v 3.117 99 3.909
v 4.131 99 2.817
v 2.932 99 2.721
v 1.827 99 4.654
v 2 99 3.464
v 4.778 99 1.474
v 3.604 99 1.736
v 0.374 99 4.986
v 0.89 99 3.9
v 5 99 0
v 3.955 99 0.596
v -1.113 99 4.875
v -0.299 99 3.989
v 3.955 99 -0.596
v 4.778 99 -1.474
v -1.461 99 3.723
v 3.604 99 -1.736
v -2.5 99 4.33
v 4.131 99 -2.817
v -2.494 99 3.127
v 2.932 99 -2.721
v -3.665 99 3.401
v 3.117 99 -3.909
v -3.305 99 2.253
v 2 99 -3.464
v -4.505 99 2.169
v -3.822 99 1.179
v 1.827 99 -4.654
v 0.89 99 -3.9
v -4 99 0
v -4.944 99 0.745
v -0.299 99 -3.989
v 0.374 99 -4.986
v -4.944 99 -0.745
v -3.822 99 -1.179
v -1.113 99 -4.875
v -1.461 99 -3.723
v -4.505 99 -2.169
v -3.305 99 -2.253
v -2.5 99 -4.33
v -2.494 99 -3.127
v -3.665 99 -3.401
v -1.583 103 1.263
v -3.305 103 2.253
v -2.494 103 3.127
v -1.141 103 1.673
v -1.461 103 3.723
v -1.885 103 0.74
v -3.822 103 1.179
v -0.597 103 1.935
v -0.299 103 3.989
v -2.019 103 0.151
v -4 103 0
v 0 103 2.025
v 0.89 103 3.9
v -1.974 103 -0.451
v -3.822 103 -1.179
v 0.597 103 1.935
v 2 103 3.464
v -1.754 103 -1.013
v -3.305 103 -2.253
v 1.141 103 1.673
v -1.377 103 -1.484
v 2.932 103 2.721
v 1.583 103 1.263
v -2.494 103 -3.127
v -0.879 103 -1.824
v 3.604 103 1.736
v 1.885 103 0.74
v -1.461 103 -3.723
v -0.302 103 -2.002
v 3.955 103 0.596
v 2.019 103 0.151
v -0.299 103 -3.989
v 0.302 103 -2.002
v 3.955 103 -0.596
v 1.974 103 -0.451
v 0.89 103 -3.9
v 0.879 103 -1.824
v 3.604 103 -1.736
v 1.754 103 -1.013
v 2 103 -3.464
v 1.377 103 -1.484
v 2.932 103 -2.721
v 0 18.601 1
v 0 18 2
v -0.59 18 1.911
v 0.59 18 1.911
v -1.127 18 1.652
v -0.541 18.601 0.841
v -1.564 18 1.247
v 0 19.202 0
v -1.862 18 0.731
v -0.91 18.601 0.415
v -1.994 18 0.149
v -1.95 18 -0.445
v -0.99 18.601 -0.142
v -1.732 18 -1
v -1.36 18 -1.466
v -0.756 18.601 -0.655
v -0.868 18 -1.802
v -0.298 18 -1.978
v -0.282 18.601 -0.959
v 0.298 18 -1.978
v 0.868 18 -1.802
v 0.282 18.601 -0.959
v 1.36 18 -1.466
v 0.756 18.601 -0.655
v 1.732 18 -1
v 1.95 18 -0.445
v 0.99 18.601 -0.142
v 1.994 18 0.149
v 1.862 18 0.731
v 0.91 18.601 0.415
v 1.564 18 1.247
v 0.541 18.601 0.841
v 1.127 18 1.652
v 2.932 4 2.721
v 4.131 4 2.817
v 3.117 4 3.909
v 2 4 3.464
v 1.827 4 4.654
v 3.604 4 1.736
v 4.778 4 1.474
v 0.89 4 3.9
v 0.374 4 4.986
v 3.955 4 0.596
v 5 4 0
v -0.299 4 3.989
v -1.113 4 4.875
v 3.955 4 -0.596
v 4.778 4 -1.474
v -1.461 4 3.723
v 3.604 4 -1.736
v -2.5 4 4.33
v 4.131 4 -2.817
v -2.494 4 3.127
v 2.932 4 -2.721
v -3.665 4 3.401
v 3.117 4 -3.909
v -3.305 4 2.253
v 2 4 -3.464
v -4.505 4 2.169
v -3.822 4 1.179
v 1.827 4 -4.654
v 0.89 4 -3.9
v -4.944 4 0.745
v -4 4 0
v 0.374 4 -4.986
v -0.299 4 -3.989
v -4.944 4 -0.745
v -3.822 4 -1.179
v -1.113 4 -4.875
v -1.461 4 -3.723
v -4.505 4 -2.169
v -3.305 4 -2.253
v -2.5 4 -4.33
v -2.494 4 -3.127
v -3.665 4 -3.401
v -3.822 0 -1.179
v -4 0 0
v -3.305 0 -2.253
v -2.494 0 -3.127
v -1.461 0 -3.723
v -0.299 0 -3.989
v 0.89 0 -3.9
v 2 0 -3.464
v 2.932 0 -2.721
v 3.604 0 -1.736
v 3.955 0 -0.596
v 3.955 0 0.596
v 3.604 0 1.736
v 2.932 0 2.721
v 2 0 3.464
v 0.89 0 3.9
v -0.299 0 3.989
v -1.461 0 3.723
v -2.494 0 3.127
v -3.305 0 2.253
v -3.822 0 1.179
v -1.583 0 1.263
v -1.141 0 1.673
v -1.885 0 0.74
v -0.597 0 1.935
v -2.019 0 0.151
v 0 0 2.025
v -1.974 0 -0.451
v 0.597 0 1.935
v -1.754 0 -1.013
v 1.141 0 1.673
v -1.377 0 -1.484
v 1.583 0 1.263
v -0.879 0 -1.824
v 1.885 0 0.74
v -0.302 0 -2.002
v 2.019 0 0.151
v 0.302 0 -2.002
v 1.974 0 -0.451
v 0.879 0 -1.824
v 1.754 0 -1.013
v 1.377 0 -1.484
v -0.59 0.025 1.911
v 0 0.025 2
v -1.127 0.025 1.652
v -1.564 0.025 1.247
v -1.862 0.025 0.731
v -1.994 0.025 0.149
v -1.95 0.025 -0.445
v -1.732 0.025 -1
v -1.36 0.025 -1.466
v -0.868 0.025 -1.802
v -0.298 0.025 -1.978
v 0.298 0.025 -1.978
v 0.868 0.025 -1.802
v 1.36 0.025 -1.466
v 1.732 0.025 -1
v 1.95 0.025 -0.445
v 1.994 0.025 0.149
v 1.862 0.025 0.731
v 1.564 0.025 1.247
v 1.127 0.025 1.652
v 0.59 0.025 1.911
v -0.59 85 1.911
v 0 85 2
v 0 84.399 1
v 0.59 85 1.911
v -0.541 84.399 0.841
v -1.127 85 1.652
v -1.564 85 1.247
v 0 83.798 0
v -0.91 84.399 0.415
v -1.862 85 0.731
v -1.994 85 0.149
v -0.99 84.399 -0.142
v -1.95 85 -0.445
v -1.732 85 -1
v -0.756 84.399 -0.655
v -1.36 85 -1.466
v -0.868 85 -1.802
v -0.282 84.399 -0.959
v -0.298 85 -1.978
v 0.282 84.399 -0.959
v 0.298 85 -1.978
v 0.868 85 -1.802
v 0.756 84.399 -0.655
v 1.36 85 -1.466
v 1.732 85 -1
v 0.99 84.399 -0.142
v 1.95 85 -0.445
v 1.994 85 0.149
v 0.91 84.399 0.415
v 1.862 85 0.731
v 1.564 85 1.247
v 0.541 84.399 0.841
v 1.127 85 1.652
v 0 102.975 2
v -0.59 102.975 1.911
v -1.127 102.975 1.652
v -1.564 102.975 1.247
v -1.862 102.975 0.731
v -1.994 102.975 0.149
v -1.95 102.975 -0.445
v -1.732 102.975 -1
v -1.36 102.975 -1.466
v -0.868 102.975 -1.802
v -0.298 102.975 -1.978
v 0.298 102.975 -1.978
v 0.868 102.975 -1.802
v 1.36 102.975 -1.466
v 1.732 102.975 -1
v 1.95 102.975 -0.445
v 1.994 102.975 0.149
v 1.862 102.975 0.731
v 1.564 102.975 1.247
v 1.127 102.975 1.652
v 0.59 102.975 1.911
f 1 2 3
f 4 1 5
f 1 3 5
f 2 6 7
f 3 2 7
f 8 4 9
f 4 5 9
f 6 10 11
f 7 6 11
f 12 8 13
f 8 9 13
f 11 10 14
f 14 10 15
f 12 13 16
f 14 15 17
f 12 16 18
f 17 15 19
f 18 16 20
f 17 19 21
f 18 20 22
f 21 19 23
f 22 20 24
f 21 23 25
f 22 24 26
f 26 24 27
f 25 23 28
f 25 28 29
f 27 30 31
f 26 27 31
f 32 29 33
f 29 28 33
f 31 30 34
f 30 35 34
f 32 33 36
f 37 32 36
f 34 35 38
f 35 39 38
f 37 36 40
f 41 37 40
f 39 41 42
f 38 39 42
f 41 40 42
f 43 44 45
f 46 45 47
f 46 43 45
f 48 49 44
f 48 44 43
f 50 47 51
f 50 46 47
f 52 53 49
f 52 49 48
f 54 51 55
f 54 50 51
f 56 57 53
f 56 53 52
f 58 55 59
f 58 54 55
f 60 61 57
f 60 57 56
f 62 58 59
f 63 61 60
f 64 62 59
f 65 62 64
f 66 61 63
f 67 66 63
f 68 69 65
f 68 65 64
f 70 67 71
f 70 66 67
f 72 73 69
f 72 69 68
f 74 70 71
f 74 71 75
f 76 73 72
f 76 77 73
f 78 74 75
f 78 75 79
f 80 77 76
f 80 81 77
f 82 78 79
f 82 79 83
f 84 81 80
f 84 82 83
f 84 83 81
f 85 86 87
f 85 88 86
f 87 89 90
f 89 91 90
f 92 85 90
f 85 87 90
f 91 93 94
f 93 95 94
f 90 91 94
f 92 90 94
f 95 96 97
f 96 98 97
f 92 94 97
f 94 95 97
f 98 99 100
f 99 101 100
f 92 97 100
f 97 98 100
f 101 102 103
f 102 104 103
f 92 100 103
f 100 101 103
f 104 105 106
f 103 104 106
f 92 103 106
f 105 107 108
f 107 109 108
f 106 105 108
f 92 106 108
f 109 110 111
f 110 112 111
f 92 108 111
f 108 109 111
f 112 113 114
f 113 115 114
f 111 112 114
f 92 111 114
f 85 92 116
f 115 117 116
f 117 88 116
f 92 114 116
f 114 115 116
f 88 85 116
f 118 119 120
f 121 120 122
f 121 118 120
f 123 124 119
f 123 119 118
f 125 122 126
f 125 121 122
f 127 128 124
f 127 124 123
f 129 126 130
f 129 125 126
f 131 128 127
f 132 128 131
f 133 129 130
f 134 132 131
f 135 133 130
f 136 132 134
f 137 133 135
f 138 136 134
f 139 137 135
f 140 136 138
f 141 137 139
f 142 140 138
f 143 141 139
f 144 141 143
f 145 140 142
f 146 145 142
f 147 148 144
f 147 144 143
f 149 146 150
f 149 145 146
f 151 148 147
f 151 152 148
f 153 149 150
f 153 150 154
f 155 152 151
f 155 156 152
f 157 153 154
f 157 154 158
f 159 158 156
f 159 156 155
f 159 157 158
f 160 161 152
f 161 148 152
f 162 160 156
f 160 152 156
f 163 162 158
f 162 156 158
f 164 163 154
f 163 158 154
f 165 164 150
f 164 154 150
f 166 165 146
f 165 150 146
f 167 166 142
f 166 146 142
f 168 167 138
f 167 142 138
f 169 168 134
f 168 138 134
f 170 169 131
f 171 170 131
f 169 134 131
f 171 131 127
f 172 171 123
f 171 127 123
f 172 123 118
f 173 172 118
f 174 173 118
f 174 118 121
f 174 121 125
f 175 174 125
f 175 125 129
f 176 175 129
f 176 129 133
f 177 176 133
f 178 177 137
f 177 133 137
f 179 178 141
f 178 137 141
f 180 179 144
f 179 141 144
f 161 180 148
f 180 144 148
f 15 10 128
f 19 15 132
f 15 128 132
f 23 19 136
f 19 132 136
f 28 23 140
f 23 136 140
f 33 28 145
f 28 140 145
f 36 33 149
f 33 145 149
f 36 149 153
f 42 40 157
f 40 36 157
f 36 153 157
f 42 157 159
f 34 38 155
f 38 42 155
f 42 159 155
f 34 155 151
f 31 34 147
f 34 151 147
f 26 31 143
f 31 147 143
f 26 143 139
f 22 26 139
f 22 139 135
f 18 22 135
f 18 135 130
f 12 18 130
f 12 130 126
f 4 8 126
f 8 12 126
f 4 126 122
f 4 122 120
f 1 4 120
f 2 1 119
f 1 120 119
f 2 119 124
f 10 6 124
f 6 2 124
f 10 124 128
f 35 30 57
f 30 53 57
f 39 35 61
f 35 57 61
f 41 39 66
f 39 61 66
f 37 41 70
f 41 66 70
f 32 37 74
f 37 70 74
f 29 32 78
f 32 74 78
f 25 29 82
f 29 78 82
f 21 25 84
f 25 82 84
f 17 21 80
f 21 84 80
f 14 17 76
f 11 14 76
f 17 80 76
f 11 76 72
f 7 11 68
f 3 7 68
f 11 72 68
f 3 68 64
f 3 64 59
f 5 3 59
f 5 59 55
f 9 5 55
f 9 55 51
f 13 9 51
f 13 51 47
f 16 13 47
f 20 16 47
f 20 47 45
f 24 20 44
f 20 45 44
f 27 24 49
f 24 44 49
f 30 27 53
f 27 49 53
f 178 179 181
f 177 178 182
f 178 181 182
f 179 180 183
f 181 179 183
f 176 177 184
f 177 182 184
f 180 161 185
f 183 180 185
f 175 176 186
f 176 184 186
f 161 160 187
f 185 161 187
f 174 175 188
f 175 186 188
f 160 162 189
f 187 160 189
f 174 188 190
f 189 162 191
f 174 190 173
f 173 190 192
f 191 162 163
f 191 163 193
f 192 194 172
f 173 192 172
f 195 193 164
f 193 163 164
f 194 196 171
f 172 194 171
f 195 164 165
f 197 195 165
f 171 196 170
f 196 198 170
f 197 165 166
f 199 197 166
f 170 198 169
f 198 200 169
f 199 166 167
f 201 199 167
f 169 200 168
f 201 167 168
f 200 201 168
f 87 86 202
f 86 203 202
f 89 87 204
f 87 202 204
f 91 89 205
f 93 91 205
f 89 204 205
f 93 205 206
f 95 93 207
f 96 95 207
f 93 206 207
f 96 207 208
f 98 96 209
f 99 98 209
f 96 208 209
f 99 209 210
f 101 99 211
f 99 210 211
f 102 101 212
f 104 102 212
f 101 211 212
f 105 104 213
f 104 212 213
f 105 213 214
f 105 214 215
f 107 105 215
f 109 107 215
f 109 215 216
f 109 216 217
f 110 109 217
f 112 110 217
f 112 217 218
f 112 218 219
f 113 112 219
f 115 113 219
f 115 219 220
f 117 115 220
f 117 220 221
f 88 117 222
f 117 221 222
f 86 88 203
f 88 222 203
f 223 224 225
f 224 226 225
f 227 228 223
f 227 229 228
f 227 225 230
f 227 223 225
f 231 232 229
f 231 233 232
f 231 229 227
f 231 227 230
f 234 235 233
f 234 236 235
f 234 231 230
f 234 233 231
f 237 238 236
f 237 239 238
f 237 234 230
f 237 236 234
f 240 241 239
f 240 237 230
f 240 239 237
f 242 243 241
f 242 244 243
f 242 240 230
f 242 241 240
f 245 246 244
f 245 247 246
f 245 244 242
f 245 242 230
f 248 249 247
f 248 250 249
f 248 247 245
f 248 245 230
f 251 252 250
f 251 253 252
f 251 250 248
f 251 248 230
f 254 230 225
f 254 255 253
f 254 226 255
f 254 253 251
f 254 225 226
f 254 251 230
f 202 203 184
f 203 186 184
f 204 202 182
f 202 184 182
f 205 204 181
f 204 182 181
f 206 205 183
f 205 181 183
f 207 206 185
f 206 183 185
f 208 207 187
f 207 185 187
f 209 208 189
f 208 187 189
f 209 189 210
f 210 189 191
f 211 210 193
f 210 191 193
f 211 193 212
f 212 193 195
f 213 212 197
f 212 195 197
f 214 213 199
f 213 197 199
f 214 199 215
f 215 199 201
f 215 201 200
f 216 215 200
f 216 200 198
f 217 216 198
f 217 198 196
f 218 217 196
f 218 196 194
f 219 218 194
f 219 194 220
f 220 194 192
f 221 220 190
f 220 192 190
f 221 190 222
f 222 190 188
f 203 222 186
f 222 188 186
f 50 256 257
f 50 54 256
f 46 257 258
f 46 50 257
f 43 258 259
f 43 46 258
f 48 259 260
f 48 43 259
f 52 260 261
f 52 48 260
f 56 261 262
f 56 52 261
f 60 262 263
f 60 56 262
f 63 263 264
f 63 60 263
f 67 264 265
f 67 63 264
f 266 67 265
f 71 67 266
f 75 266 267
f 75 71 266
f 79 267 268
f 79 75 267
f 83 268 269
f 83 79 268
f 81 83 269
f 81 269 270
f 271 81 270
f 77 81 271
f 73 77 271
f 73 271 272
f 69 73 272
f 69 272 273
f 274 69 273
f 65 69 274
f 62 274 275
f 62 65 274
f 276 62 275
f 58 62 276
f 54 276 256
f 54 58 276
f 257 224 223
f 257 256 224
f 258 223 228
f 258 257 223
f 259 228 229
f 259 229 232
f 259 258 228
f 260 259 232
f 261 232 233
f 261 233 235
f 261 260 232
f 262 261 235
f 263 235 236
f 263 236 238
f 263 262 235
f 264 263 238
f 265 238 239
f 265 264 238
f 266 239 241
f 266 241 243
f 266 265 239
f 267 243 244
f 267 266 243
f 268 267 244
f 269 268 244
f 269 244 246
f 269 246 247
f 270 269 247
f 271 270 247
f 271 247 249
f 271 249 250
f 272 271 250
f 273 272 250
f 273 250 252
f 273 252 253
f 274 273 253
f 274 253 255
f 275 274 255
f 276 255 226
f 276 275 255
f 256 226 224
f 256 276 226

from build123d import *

# Parameters (mm, degrees)
SKETCH1_R           = 5
BOSS_EXTRUDE1_DEPTH = 103
SKETCH5_W           = 1
SKETCH5_H           = 4


with BuildPart() as part:
    # Sketch1 → Boss-Extrude1 (new body)
    with BuildSketch(Plane(origin=(0, 0, 0), x_dir=(1, 0, 0), z_dir=(0, 1, 0))):
        Circle(SKETCH1_R)
    extrude(amount=BOSS_EXTRUDE1_DEPTH)

    # Sketch4 → Ø4.0mm Dowel Hole1 (revolve, cut)
    with BuildSketch(Plane(origin=(0, 103, 0), x_dir=(0, 0, 1), z_dir=(1, 0, 0))):
        Polygon((0, 0), (0, 19.201721238), (2, 18), (2, 0.025), (2.025, 0), align=None)
    f_4_0mm_dowel_hole1 = revolve(axis=Axis((0, 109.35, 0), (0, -1, 0)), mode=Mode.SUBTRACT)

    # Mirror1: Ø4.0mm Dowel Hole1 across plane
    add(f_4_0mm_dowel_hole1.mirror(Plane.ZX.offset(51.5)), mode=Mode.SUBTRACT)

    # Sketch5 → Cut-Revolve2 (revolve, cut)
    with BuildSketch(Plane.XY):
        with Locations((-4.5, 101)):
            Rectangle(SKETCH5_W, SKETCH5_H)
        with Locations((-4.5, 2)):
            Rectangle(SKETCH5_W, SKETCH5_H)
    revolve(axis=Axis((0, 103, 0), (0, -1, 0)), mode=Mode.SUBTRACT)


solid = part.part
